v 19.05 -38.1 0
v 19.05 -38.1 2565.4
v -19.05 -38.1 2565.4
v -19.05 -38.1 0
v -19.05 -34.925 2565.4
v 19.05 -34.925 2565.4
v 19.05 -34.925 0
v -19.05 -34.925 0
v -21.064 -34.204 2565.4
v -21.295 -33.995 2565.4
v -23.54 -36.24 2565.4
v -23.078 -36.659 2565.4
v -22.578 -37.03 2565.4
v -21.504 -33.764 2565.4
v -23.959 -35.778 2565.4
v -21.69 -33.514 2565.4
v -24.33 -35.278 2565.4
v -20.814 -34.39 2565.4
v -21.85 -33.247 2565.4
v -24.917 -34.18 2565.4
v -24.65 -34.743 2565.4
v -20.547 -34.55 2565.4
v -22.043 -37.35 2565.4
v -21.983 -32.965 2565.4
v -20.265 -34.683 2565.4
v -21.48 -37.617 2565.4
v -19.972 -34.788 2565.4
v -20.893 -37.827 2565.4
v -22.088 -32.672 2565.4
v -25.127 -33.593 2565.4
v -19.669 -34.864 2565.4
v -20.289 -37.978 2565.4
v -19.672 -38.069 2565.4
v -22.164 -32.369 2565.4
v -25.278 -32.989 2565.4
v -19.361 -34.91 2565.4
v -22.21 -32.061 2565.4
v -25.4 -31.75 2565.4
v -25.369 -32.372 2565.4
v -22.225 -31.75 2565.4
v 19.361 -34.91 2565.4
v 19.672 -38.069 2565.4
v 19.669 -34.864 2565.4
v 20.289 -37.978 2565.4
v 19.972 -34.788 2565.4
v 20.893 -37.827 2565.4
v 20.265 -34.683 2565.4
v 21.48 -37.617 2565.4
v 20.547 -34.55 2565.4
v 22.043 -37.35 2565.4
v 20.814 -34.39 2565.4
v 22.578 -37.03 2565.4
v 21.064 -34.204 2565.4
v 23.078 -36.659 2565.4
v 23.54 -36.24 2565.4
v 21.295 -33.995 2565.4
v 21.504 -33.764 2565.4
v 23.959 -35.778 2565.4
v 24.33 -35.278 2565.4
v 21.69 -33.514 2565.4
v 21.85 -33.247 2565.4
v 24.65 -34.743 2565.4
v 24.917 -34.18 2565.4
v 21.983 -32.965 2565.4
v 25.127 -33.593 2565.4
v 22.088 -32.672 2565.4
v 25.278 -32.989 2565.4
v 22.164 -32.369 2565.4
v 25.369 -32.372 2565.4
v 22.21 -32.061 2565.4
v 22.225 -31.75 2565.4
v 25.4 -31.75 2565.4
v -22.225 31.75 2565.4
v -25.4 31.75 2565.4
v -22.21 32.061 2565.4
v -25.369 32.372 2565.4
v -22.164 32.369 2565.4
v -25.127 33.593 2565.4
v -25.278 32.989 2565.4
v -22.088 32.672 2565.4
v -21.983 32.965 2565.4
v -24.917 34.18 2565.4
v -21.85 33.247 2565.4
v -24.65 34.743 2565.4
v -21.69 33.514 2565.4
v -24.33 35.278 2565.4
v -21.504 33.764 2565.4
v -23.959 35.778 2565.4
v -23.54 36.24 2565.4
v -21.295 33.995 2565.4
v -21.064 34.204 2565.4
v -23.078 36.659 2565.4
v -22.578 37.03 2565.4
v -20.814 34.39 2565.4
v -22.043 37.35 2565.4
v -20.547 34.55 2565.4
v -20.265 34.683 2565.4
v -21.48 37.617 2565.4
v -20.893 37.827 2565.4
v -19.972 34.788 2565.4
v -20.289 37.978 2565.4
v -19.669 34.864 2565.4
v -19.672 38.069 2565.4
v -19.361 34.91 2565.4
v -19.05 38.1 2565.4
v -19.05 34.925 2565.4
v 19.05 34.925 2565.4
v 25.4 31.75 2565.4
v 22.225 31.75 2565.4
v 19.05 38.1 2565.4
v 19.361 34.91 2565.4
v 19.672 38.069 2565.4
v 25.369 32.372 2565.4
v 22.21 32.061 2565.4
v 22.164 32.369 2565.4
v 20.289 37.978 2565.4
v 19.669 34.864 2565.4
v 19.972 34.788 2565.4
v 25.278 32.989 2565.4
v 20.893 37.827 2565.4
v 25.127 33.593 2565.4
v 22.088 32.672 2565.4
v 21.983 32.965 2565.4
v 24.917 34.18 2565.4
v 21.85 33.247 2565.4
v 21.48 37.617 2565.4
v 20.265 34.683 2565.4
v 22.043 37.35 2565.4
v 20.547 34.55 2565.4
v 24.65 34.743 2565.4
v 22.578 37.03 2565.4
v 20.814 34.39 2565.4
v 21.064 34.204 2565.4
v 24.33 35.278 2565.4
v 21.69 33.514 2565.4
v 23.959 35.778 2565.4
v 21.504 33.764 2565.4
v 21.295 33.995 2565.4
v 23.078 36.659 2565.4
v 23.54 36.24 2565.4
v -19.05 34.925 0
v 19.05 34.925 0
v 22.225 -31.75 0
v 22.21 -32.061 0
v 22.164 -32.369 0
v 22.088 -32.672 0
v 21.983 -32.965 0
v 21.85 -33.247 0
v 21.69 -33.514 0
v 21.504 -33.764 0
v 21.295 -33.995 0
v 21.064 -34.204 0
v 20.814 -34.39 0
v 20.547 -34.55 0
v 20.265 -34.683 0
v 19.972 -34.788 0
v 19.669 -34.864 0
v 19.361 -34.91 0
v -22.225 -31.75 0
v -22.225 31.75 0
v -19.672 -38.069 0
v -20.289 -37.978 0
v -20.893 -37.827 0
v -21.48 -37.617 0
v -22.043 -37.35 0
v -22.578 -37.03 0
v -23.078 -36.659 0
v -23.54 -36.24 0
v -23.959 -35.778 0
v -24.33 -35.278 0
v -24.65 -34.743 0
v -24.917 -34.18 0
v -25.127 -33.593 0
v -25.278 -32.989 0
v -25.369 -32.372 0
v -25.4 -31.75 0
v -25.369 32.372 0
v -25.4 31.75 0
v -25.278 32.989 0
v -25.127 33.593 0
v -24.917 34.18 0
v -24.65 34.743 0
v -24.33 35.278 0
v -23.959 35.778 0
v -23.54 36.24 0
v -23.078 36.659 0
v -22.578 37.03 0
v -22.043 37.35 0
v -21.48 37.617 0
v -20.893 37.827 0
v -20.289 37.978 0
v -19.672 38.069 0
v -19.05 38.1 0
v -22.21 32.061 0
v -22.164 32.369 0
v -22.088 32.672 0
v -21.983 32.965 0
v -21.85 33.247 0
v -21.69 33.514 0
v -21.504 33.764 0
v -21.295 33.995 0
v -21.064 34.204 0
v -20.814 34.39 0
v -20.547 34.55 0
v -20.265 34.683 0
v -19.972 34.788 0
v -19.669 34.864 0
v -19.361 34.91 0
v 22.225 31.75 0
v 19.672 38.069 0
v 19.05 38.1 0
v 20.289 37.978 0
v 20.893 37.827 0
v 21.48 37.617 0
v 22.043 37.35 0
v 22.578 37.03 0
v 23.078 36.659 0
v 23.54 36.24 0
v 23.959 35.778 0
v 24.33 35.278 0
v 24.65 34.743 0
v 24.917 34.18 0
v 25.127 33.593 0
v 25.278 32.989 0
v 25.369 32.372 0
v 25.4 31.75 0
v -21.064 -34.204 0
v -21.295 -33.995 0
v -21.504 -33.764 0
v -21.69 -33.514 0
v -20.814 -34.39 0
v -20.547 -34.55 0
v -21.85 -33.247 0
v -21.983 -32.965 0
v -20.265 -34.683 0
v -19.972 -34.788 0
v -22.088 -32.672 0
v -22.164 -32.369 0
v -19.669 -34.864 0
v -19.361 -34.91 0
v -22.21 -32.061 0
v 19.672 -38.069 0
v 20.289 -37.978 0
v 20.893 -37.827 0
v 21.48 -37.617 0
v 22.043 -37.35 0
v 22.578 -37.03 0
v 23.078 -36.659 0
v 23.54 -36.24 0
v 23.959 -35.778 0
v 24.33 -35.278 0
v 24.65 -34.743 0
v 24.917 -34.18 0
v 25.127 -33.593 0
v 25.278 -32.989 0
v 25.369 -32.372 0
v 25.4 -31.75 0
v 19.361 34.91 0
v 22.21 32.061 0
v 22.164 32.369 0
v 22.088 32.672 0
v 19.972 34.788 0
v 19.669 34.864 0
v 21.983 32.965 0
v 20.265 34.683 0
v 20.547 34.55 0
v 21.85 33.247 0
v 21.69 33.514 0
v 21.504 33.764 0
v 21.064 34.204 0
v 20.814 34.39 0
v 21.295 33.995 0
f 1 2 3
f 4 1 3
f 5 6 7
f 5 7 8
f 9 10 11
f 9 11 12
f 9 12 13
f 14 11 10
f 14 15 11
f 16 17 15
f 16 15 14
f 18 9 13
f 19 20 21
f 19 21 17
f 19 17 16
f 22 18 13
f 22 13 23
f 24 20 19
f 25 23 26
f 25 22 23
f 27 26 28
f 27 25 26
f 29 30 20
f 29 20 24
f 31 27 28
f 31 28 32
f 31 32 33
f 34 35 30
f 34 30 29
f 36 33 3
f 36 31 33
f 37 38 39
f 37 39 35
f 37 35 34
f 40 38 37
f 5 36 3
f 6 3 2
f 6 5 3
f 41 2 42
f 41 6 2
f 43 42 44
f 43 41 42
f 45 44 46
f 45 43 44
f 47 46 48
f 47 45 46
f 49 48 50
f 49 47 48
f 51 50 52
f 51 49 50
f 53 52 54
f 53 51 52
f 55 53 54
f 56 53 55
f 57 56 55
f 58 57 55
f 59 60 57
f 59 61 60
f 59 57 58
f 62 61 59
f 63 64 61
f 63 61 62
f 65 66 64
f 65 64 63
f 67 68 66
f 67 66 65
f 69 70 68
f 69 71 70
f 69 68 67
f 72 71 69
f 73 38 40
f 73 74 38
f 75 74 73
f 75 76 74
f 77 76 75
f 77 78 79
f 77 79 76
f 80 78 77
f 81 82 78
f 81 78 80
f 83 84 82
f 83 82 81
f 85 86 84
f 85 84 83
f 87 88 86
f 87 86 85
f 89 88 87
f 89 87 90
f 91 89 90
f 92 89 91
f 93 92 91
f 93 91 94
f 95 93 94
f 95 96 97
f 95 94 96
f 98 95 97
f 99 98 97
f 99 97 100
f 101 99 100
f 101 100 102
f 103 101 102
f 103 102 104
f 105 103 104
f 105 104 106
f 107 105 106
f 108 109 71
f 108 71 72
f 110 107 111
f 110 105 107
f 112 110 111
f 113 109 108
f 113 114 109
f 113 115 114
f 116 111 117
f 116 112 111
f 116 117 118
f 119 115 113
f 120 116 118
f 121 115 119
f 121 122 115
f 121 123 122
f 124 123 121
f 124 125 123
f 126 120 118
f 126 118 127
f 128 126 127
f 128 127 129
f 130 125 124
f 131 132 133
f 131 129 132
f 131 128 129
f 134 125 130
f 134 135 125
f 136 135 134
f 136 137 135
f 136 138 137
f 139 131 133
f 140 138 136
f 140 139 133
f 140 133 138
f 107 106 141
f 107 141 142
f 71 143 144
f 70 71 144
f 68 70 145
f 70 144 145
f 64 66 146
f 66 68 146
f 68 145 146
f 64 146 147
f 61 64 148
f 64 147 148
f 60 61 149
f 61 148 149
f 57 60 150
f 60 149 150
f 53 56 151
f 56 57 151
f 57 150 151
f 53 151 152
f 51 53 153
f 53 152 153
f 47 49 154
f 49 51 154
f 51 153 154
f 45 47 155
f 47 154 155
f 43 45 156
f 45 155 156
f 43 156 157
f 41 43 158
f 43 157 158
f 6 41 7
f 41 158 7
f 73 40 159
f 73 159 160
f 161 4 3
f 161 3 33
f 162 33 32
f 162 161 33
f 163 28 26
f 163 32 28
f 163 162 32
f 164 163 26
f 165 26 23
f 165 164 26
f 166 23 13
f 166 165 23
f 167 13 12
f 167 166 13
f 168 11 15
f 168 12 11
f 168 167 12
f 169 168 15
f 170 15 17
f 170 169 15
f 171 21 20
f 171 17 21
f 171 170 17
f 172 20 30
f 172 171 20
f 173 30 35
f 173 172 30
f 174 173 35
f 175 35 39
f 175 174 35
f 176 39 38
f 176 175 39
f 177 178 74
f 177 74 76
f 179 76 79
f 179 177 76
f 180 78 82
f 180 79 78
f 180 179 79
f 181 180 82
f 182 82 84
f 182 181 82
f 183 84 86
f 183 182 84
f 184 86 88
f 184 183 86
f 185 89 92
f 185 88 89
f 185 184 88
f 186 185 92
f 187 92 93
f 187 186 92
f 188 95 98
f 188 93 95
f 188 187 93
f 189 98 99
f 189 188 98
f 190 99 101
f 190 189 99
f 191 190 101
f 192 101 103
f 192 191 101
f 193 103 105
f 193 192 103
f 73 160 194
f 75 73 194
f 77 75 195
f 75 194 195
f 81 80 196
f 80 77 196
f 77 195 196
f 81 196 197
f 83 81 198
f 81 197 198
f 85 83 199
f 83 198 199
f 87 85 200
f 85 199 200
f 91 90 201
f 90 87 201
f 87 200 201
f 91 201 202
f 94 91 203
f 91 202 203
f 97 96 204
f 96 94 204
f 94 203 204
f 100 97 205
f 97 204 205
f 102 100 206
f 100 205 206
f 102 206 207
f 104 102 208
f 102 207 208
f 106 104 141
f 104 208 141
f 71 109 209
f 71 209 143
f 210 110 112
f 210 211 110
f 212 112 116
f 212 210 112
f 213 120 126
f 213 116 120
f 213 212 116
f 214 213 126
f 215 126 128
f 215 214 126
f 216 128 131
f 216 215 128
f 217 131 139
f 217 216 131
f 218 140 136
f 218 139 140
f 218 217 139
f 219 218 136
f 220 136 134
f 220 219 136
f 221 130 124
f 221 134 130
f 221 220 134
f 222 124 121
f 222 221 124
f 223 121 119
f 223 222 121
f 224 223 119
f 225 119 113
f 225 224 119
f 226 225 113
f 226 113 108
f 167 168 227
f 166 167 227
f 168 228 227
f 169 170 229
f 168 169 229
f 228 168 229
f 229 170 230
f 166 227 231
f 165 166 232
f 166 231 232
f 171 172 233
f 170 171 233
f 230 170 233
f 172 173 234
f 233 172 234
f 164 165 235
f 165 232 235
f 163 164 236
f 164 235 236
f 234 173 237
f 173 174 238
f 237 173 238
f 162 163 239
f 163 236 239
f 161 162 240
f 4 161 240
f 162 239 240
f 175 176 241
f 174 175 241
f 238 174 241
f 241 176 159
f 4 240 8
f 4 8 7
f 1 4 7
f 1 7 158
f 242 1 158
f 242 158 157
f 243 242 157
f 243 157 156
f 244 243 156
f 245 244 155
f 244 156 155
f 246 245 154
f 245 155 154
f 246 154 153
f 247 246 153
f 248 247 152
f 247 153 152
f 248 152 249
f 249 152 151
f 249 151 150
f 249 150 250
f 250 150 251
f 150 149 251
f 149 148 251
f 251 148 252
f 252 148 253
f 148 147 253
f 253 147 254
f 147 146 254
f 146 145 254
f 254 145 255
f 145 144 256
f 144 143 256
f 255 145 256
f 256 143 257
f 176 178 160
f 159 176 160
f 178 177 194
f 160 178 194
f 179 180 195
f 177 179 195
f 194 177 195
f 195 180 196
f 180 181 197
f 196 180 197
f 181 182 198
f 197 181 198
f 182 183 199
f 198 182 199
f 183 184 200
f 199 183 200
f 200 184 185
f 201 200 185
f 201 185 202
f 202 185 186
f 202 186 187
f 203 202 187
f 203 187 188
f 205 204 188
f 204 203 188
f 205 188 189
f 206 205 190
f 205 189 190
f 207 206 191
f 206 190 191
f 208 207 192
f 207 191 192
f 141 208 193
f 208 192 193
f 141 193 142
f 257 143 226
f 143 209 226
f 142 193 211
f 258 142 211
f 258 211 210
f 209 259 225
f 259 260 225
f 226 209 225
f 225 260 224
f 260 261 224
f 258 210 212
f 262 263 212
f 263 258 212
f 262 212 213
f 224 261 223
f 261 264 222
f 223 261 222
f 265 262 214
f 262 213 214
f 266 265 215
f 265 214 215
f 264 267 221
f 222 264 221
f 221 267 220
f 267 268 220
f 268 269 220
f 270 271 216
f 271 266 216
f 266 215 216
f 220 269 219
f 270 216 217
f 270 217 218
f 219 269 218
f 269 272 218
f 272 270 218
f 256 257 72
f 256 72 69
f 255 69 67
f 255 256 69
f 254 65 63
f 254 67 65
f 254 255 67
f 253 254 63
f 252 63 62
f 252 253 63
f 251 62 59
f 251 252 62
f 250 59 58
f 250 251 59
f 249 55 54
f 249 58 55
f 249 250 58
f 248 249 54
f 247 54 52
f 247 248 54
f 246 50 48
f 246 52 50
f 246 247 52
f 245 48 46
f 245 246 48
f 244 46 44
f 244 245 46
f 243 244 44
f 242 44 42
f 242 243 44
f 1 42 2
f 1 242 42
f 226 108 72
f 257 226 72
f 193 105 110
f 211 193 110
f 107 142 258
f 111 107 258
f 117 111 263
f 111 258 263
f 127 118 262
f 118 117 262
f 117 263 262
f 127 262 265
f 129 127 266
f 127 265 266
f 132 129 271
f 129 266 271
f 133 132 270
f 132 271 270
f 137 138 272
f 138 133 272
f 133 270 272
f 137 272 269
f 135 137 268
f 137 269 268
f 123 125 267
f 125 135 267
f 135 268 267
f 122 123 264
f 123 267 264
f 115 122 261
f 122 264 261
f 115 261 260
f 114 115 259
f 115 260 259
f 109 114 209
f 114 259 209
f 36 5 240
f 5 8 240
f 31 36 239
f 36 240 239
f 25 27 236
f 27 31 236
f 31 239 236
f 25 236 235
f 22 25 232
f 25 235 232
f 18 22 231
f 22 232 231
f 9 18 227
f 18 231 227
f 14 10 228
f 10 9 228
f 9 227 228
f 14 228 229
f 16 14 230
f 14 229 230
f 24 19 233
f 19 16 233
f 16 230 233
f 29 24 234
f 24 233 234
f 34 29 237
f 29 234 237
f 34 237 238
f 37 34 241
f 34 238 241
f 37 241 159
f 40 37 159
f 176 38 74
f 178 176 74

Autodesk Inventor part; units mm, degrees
ref_plane "Start Plane" through (0, 0, 0) normal (0, 0, 1) x (1, 0, 0)
ref_plane "End Plane" through (0, 0, 2565.4) normal (0, 0, 1) x (1, 0, 0)
sketch "Sketch" plane through (0, 0, 0) normal (0, 0, 1) x (1, 0, 0)
  line L0 (-25.4, -31.75) -> (-25.4, 31.75)
  line L1 (-19.05, 38.1) -> (19.05, 38.1)
  line L2 (25.4, 31.75) -> (25.4, -31.75)
  line L3 (19.05, -38.1) -> (-19.05, -38.1)
  arc A0 (-25.4, -31.75) -> (-19.05, -38.1) centre (-19.05, -31.75) ccw
  arc A1 (-19.05, 38.1) -> (-25.4, 31.75) centre (-19.05, 31.75) ccw
  arc A2 (25.4, 31.75) -> (19.05, 38.1) centre (19.05, 31.75) ccw
  arc A3 (19.05, -38.1) -> (25.4, -31.75) centre (19.05, -31.75) ccw
  arc A4 (-19.05, 34.925) -> (-22.225, 31.75) centre (-19.05, 31.75) ccw
  line L4 (-19.05, 34.925) -> (19.05, 34.925)
  arc A5 (22.225, 31.75) -> (19.05, 34.925) centre (19.05, 31.75) ccw
  line L5 (22.225, 31.75) -> (22.225, -31.75)
  arc A6 (19.05, -34.925) -> (22.225, -31.75) centre (19.05, -31.75) ccw
  line L6 (19.05, -34.925) -> (-19.05, -34.925)
  arc A7 (-22.225, -31.75) -> (-19.05, -34.925) centre (-19.05, -31.75) ccw
  line L7 (-22.225, -31.75) -> (-22.225, 31.75)
  line L8 (0, 55.1812) -> (0, -55.1812) construction
  line L9 (-37.4012, 0) -> (37.4012, 0) construction
  dimension "d10" = 76.2
  dimension "d11" = 50.8
  dimension "d12" = 3.175
  dimension "d15" = 38.1
  dimension "d16" = 25.4
  dimension "d17" = 6.35
extrude "Body" add sketch "Sketch" along normal up to surface (2565.4 mm away) from surface at 0
sketch "Sketch3" plane through (0, 0, 0) normal (0, 0, 1) x (1, 0, 0)
  line L0 (0, 0) -> (10, 0)
ref_plane "Work Plane3" through (0, 0, 0) normal (0, -1, 0) x (1, 0, 0)
ref_plane "Work Plane4" through (1219.169, 0, 0) normal (0, 0, -1) x (-1, 0, 0)
split "Split1" plane through (1219.169, 0, 0) removes the side toward (0, 0, -1)
ref_plane "Work Plane5" through (-25.4, 0, 2565.4) normal (0, 0, 1) x (1, 0, 0)
split "Split2" plane through (-25.4, 0, 2565.4) removes the side toward (0, 0, 1)
sketch "Sketch4" plane through (0, 0, 0) normal (0, -1, 0) x (1, 0, 0)
  line L0 (-2, 0) -> (12, 0) projected
  line L1 (-2, 2565.4) -> (12, 2565.4) projected
  dimension "d19" = 2565.4
equation "\"d10\" = G_H"
equation "\"d11\" = G_W"
equation "\"d12\" = G_T"
equation "\"d15\" = 0.5 * d10"
equation "\"d16\" = 0.5 * d11"
equation "\"d17\" = G_IR"
equation "\"d3\" = G_L"
equation "\"G_W\" = 50.8"
equation "\"G_H\" = 76.2"
equation "\"G_T\" = 3.175"
equation "\"G_IR\" = 6.35"
equation "\"G_L\" = d19"
equation "\"G_OFFSET_START\" = 0"
equation "\"G_OFFSET_END\" = 0"
equation "\"d14\" = G_OFFSET_END + B_L"
equation "\"B_L\" = 2565.4"
properties part number "AISC - 3 x 2 x 1/8 - 101" material "Steel, Mild"
